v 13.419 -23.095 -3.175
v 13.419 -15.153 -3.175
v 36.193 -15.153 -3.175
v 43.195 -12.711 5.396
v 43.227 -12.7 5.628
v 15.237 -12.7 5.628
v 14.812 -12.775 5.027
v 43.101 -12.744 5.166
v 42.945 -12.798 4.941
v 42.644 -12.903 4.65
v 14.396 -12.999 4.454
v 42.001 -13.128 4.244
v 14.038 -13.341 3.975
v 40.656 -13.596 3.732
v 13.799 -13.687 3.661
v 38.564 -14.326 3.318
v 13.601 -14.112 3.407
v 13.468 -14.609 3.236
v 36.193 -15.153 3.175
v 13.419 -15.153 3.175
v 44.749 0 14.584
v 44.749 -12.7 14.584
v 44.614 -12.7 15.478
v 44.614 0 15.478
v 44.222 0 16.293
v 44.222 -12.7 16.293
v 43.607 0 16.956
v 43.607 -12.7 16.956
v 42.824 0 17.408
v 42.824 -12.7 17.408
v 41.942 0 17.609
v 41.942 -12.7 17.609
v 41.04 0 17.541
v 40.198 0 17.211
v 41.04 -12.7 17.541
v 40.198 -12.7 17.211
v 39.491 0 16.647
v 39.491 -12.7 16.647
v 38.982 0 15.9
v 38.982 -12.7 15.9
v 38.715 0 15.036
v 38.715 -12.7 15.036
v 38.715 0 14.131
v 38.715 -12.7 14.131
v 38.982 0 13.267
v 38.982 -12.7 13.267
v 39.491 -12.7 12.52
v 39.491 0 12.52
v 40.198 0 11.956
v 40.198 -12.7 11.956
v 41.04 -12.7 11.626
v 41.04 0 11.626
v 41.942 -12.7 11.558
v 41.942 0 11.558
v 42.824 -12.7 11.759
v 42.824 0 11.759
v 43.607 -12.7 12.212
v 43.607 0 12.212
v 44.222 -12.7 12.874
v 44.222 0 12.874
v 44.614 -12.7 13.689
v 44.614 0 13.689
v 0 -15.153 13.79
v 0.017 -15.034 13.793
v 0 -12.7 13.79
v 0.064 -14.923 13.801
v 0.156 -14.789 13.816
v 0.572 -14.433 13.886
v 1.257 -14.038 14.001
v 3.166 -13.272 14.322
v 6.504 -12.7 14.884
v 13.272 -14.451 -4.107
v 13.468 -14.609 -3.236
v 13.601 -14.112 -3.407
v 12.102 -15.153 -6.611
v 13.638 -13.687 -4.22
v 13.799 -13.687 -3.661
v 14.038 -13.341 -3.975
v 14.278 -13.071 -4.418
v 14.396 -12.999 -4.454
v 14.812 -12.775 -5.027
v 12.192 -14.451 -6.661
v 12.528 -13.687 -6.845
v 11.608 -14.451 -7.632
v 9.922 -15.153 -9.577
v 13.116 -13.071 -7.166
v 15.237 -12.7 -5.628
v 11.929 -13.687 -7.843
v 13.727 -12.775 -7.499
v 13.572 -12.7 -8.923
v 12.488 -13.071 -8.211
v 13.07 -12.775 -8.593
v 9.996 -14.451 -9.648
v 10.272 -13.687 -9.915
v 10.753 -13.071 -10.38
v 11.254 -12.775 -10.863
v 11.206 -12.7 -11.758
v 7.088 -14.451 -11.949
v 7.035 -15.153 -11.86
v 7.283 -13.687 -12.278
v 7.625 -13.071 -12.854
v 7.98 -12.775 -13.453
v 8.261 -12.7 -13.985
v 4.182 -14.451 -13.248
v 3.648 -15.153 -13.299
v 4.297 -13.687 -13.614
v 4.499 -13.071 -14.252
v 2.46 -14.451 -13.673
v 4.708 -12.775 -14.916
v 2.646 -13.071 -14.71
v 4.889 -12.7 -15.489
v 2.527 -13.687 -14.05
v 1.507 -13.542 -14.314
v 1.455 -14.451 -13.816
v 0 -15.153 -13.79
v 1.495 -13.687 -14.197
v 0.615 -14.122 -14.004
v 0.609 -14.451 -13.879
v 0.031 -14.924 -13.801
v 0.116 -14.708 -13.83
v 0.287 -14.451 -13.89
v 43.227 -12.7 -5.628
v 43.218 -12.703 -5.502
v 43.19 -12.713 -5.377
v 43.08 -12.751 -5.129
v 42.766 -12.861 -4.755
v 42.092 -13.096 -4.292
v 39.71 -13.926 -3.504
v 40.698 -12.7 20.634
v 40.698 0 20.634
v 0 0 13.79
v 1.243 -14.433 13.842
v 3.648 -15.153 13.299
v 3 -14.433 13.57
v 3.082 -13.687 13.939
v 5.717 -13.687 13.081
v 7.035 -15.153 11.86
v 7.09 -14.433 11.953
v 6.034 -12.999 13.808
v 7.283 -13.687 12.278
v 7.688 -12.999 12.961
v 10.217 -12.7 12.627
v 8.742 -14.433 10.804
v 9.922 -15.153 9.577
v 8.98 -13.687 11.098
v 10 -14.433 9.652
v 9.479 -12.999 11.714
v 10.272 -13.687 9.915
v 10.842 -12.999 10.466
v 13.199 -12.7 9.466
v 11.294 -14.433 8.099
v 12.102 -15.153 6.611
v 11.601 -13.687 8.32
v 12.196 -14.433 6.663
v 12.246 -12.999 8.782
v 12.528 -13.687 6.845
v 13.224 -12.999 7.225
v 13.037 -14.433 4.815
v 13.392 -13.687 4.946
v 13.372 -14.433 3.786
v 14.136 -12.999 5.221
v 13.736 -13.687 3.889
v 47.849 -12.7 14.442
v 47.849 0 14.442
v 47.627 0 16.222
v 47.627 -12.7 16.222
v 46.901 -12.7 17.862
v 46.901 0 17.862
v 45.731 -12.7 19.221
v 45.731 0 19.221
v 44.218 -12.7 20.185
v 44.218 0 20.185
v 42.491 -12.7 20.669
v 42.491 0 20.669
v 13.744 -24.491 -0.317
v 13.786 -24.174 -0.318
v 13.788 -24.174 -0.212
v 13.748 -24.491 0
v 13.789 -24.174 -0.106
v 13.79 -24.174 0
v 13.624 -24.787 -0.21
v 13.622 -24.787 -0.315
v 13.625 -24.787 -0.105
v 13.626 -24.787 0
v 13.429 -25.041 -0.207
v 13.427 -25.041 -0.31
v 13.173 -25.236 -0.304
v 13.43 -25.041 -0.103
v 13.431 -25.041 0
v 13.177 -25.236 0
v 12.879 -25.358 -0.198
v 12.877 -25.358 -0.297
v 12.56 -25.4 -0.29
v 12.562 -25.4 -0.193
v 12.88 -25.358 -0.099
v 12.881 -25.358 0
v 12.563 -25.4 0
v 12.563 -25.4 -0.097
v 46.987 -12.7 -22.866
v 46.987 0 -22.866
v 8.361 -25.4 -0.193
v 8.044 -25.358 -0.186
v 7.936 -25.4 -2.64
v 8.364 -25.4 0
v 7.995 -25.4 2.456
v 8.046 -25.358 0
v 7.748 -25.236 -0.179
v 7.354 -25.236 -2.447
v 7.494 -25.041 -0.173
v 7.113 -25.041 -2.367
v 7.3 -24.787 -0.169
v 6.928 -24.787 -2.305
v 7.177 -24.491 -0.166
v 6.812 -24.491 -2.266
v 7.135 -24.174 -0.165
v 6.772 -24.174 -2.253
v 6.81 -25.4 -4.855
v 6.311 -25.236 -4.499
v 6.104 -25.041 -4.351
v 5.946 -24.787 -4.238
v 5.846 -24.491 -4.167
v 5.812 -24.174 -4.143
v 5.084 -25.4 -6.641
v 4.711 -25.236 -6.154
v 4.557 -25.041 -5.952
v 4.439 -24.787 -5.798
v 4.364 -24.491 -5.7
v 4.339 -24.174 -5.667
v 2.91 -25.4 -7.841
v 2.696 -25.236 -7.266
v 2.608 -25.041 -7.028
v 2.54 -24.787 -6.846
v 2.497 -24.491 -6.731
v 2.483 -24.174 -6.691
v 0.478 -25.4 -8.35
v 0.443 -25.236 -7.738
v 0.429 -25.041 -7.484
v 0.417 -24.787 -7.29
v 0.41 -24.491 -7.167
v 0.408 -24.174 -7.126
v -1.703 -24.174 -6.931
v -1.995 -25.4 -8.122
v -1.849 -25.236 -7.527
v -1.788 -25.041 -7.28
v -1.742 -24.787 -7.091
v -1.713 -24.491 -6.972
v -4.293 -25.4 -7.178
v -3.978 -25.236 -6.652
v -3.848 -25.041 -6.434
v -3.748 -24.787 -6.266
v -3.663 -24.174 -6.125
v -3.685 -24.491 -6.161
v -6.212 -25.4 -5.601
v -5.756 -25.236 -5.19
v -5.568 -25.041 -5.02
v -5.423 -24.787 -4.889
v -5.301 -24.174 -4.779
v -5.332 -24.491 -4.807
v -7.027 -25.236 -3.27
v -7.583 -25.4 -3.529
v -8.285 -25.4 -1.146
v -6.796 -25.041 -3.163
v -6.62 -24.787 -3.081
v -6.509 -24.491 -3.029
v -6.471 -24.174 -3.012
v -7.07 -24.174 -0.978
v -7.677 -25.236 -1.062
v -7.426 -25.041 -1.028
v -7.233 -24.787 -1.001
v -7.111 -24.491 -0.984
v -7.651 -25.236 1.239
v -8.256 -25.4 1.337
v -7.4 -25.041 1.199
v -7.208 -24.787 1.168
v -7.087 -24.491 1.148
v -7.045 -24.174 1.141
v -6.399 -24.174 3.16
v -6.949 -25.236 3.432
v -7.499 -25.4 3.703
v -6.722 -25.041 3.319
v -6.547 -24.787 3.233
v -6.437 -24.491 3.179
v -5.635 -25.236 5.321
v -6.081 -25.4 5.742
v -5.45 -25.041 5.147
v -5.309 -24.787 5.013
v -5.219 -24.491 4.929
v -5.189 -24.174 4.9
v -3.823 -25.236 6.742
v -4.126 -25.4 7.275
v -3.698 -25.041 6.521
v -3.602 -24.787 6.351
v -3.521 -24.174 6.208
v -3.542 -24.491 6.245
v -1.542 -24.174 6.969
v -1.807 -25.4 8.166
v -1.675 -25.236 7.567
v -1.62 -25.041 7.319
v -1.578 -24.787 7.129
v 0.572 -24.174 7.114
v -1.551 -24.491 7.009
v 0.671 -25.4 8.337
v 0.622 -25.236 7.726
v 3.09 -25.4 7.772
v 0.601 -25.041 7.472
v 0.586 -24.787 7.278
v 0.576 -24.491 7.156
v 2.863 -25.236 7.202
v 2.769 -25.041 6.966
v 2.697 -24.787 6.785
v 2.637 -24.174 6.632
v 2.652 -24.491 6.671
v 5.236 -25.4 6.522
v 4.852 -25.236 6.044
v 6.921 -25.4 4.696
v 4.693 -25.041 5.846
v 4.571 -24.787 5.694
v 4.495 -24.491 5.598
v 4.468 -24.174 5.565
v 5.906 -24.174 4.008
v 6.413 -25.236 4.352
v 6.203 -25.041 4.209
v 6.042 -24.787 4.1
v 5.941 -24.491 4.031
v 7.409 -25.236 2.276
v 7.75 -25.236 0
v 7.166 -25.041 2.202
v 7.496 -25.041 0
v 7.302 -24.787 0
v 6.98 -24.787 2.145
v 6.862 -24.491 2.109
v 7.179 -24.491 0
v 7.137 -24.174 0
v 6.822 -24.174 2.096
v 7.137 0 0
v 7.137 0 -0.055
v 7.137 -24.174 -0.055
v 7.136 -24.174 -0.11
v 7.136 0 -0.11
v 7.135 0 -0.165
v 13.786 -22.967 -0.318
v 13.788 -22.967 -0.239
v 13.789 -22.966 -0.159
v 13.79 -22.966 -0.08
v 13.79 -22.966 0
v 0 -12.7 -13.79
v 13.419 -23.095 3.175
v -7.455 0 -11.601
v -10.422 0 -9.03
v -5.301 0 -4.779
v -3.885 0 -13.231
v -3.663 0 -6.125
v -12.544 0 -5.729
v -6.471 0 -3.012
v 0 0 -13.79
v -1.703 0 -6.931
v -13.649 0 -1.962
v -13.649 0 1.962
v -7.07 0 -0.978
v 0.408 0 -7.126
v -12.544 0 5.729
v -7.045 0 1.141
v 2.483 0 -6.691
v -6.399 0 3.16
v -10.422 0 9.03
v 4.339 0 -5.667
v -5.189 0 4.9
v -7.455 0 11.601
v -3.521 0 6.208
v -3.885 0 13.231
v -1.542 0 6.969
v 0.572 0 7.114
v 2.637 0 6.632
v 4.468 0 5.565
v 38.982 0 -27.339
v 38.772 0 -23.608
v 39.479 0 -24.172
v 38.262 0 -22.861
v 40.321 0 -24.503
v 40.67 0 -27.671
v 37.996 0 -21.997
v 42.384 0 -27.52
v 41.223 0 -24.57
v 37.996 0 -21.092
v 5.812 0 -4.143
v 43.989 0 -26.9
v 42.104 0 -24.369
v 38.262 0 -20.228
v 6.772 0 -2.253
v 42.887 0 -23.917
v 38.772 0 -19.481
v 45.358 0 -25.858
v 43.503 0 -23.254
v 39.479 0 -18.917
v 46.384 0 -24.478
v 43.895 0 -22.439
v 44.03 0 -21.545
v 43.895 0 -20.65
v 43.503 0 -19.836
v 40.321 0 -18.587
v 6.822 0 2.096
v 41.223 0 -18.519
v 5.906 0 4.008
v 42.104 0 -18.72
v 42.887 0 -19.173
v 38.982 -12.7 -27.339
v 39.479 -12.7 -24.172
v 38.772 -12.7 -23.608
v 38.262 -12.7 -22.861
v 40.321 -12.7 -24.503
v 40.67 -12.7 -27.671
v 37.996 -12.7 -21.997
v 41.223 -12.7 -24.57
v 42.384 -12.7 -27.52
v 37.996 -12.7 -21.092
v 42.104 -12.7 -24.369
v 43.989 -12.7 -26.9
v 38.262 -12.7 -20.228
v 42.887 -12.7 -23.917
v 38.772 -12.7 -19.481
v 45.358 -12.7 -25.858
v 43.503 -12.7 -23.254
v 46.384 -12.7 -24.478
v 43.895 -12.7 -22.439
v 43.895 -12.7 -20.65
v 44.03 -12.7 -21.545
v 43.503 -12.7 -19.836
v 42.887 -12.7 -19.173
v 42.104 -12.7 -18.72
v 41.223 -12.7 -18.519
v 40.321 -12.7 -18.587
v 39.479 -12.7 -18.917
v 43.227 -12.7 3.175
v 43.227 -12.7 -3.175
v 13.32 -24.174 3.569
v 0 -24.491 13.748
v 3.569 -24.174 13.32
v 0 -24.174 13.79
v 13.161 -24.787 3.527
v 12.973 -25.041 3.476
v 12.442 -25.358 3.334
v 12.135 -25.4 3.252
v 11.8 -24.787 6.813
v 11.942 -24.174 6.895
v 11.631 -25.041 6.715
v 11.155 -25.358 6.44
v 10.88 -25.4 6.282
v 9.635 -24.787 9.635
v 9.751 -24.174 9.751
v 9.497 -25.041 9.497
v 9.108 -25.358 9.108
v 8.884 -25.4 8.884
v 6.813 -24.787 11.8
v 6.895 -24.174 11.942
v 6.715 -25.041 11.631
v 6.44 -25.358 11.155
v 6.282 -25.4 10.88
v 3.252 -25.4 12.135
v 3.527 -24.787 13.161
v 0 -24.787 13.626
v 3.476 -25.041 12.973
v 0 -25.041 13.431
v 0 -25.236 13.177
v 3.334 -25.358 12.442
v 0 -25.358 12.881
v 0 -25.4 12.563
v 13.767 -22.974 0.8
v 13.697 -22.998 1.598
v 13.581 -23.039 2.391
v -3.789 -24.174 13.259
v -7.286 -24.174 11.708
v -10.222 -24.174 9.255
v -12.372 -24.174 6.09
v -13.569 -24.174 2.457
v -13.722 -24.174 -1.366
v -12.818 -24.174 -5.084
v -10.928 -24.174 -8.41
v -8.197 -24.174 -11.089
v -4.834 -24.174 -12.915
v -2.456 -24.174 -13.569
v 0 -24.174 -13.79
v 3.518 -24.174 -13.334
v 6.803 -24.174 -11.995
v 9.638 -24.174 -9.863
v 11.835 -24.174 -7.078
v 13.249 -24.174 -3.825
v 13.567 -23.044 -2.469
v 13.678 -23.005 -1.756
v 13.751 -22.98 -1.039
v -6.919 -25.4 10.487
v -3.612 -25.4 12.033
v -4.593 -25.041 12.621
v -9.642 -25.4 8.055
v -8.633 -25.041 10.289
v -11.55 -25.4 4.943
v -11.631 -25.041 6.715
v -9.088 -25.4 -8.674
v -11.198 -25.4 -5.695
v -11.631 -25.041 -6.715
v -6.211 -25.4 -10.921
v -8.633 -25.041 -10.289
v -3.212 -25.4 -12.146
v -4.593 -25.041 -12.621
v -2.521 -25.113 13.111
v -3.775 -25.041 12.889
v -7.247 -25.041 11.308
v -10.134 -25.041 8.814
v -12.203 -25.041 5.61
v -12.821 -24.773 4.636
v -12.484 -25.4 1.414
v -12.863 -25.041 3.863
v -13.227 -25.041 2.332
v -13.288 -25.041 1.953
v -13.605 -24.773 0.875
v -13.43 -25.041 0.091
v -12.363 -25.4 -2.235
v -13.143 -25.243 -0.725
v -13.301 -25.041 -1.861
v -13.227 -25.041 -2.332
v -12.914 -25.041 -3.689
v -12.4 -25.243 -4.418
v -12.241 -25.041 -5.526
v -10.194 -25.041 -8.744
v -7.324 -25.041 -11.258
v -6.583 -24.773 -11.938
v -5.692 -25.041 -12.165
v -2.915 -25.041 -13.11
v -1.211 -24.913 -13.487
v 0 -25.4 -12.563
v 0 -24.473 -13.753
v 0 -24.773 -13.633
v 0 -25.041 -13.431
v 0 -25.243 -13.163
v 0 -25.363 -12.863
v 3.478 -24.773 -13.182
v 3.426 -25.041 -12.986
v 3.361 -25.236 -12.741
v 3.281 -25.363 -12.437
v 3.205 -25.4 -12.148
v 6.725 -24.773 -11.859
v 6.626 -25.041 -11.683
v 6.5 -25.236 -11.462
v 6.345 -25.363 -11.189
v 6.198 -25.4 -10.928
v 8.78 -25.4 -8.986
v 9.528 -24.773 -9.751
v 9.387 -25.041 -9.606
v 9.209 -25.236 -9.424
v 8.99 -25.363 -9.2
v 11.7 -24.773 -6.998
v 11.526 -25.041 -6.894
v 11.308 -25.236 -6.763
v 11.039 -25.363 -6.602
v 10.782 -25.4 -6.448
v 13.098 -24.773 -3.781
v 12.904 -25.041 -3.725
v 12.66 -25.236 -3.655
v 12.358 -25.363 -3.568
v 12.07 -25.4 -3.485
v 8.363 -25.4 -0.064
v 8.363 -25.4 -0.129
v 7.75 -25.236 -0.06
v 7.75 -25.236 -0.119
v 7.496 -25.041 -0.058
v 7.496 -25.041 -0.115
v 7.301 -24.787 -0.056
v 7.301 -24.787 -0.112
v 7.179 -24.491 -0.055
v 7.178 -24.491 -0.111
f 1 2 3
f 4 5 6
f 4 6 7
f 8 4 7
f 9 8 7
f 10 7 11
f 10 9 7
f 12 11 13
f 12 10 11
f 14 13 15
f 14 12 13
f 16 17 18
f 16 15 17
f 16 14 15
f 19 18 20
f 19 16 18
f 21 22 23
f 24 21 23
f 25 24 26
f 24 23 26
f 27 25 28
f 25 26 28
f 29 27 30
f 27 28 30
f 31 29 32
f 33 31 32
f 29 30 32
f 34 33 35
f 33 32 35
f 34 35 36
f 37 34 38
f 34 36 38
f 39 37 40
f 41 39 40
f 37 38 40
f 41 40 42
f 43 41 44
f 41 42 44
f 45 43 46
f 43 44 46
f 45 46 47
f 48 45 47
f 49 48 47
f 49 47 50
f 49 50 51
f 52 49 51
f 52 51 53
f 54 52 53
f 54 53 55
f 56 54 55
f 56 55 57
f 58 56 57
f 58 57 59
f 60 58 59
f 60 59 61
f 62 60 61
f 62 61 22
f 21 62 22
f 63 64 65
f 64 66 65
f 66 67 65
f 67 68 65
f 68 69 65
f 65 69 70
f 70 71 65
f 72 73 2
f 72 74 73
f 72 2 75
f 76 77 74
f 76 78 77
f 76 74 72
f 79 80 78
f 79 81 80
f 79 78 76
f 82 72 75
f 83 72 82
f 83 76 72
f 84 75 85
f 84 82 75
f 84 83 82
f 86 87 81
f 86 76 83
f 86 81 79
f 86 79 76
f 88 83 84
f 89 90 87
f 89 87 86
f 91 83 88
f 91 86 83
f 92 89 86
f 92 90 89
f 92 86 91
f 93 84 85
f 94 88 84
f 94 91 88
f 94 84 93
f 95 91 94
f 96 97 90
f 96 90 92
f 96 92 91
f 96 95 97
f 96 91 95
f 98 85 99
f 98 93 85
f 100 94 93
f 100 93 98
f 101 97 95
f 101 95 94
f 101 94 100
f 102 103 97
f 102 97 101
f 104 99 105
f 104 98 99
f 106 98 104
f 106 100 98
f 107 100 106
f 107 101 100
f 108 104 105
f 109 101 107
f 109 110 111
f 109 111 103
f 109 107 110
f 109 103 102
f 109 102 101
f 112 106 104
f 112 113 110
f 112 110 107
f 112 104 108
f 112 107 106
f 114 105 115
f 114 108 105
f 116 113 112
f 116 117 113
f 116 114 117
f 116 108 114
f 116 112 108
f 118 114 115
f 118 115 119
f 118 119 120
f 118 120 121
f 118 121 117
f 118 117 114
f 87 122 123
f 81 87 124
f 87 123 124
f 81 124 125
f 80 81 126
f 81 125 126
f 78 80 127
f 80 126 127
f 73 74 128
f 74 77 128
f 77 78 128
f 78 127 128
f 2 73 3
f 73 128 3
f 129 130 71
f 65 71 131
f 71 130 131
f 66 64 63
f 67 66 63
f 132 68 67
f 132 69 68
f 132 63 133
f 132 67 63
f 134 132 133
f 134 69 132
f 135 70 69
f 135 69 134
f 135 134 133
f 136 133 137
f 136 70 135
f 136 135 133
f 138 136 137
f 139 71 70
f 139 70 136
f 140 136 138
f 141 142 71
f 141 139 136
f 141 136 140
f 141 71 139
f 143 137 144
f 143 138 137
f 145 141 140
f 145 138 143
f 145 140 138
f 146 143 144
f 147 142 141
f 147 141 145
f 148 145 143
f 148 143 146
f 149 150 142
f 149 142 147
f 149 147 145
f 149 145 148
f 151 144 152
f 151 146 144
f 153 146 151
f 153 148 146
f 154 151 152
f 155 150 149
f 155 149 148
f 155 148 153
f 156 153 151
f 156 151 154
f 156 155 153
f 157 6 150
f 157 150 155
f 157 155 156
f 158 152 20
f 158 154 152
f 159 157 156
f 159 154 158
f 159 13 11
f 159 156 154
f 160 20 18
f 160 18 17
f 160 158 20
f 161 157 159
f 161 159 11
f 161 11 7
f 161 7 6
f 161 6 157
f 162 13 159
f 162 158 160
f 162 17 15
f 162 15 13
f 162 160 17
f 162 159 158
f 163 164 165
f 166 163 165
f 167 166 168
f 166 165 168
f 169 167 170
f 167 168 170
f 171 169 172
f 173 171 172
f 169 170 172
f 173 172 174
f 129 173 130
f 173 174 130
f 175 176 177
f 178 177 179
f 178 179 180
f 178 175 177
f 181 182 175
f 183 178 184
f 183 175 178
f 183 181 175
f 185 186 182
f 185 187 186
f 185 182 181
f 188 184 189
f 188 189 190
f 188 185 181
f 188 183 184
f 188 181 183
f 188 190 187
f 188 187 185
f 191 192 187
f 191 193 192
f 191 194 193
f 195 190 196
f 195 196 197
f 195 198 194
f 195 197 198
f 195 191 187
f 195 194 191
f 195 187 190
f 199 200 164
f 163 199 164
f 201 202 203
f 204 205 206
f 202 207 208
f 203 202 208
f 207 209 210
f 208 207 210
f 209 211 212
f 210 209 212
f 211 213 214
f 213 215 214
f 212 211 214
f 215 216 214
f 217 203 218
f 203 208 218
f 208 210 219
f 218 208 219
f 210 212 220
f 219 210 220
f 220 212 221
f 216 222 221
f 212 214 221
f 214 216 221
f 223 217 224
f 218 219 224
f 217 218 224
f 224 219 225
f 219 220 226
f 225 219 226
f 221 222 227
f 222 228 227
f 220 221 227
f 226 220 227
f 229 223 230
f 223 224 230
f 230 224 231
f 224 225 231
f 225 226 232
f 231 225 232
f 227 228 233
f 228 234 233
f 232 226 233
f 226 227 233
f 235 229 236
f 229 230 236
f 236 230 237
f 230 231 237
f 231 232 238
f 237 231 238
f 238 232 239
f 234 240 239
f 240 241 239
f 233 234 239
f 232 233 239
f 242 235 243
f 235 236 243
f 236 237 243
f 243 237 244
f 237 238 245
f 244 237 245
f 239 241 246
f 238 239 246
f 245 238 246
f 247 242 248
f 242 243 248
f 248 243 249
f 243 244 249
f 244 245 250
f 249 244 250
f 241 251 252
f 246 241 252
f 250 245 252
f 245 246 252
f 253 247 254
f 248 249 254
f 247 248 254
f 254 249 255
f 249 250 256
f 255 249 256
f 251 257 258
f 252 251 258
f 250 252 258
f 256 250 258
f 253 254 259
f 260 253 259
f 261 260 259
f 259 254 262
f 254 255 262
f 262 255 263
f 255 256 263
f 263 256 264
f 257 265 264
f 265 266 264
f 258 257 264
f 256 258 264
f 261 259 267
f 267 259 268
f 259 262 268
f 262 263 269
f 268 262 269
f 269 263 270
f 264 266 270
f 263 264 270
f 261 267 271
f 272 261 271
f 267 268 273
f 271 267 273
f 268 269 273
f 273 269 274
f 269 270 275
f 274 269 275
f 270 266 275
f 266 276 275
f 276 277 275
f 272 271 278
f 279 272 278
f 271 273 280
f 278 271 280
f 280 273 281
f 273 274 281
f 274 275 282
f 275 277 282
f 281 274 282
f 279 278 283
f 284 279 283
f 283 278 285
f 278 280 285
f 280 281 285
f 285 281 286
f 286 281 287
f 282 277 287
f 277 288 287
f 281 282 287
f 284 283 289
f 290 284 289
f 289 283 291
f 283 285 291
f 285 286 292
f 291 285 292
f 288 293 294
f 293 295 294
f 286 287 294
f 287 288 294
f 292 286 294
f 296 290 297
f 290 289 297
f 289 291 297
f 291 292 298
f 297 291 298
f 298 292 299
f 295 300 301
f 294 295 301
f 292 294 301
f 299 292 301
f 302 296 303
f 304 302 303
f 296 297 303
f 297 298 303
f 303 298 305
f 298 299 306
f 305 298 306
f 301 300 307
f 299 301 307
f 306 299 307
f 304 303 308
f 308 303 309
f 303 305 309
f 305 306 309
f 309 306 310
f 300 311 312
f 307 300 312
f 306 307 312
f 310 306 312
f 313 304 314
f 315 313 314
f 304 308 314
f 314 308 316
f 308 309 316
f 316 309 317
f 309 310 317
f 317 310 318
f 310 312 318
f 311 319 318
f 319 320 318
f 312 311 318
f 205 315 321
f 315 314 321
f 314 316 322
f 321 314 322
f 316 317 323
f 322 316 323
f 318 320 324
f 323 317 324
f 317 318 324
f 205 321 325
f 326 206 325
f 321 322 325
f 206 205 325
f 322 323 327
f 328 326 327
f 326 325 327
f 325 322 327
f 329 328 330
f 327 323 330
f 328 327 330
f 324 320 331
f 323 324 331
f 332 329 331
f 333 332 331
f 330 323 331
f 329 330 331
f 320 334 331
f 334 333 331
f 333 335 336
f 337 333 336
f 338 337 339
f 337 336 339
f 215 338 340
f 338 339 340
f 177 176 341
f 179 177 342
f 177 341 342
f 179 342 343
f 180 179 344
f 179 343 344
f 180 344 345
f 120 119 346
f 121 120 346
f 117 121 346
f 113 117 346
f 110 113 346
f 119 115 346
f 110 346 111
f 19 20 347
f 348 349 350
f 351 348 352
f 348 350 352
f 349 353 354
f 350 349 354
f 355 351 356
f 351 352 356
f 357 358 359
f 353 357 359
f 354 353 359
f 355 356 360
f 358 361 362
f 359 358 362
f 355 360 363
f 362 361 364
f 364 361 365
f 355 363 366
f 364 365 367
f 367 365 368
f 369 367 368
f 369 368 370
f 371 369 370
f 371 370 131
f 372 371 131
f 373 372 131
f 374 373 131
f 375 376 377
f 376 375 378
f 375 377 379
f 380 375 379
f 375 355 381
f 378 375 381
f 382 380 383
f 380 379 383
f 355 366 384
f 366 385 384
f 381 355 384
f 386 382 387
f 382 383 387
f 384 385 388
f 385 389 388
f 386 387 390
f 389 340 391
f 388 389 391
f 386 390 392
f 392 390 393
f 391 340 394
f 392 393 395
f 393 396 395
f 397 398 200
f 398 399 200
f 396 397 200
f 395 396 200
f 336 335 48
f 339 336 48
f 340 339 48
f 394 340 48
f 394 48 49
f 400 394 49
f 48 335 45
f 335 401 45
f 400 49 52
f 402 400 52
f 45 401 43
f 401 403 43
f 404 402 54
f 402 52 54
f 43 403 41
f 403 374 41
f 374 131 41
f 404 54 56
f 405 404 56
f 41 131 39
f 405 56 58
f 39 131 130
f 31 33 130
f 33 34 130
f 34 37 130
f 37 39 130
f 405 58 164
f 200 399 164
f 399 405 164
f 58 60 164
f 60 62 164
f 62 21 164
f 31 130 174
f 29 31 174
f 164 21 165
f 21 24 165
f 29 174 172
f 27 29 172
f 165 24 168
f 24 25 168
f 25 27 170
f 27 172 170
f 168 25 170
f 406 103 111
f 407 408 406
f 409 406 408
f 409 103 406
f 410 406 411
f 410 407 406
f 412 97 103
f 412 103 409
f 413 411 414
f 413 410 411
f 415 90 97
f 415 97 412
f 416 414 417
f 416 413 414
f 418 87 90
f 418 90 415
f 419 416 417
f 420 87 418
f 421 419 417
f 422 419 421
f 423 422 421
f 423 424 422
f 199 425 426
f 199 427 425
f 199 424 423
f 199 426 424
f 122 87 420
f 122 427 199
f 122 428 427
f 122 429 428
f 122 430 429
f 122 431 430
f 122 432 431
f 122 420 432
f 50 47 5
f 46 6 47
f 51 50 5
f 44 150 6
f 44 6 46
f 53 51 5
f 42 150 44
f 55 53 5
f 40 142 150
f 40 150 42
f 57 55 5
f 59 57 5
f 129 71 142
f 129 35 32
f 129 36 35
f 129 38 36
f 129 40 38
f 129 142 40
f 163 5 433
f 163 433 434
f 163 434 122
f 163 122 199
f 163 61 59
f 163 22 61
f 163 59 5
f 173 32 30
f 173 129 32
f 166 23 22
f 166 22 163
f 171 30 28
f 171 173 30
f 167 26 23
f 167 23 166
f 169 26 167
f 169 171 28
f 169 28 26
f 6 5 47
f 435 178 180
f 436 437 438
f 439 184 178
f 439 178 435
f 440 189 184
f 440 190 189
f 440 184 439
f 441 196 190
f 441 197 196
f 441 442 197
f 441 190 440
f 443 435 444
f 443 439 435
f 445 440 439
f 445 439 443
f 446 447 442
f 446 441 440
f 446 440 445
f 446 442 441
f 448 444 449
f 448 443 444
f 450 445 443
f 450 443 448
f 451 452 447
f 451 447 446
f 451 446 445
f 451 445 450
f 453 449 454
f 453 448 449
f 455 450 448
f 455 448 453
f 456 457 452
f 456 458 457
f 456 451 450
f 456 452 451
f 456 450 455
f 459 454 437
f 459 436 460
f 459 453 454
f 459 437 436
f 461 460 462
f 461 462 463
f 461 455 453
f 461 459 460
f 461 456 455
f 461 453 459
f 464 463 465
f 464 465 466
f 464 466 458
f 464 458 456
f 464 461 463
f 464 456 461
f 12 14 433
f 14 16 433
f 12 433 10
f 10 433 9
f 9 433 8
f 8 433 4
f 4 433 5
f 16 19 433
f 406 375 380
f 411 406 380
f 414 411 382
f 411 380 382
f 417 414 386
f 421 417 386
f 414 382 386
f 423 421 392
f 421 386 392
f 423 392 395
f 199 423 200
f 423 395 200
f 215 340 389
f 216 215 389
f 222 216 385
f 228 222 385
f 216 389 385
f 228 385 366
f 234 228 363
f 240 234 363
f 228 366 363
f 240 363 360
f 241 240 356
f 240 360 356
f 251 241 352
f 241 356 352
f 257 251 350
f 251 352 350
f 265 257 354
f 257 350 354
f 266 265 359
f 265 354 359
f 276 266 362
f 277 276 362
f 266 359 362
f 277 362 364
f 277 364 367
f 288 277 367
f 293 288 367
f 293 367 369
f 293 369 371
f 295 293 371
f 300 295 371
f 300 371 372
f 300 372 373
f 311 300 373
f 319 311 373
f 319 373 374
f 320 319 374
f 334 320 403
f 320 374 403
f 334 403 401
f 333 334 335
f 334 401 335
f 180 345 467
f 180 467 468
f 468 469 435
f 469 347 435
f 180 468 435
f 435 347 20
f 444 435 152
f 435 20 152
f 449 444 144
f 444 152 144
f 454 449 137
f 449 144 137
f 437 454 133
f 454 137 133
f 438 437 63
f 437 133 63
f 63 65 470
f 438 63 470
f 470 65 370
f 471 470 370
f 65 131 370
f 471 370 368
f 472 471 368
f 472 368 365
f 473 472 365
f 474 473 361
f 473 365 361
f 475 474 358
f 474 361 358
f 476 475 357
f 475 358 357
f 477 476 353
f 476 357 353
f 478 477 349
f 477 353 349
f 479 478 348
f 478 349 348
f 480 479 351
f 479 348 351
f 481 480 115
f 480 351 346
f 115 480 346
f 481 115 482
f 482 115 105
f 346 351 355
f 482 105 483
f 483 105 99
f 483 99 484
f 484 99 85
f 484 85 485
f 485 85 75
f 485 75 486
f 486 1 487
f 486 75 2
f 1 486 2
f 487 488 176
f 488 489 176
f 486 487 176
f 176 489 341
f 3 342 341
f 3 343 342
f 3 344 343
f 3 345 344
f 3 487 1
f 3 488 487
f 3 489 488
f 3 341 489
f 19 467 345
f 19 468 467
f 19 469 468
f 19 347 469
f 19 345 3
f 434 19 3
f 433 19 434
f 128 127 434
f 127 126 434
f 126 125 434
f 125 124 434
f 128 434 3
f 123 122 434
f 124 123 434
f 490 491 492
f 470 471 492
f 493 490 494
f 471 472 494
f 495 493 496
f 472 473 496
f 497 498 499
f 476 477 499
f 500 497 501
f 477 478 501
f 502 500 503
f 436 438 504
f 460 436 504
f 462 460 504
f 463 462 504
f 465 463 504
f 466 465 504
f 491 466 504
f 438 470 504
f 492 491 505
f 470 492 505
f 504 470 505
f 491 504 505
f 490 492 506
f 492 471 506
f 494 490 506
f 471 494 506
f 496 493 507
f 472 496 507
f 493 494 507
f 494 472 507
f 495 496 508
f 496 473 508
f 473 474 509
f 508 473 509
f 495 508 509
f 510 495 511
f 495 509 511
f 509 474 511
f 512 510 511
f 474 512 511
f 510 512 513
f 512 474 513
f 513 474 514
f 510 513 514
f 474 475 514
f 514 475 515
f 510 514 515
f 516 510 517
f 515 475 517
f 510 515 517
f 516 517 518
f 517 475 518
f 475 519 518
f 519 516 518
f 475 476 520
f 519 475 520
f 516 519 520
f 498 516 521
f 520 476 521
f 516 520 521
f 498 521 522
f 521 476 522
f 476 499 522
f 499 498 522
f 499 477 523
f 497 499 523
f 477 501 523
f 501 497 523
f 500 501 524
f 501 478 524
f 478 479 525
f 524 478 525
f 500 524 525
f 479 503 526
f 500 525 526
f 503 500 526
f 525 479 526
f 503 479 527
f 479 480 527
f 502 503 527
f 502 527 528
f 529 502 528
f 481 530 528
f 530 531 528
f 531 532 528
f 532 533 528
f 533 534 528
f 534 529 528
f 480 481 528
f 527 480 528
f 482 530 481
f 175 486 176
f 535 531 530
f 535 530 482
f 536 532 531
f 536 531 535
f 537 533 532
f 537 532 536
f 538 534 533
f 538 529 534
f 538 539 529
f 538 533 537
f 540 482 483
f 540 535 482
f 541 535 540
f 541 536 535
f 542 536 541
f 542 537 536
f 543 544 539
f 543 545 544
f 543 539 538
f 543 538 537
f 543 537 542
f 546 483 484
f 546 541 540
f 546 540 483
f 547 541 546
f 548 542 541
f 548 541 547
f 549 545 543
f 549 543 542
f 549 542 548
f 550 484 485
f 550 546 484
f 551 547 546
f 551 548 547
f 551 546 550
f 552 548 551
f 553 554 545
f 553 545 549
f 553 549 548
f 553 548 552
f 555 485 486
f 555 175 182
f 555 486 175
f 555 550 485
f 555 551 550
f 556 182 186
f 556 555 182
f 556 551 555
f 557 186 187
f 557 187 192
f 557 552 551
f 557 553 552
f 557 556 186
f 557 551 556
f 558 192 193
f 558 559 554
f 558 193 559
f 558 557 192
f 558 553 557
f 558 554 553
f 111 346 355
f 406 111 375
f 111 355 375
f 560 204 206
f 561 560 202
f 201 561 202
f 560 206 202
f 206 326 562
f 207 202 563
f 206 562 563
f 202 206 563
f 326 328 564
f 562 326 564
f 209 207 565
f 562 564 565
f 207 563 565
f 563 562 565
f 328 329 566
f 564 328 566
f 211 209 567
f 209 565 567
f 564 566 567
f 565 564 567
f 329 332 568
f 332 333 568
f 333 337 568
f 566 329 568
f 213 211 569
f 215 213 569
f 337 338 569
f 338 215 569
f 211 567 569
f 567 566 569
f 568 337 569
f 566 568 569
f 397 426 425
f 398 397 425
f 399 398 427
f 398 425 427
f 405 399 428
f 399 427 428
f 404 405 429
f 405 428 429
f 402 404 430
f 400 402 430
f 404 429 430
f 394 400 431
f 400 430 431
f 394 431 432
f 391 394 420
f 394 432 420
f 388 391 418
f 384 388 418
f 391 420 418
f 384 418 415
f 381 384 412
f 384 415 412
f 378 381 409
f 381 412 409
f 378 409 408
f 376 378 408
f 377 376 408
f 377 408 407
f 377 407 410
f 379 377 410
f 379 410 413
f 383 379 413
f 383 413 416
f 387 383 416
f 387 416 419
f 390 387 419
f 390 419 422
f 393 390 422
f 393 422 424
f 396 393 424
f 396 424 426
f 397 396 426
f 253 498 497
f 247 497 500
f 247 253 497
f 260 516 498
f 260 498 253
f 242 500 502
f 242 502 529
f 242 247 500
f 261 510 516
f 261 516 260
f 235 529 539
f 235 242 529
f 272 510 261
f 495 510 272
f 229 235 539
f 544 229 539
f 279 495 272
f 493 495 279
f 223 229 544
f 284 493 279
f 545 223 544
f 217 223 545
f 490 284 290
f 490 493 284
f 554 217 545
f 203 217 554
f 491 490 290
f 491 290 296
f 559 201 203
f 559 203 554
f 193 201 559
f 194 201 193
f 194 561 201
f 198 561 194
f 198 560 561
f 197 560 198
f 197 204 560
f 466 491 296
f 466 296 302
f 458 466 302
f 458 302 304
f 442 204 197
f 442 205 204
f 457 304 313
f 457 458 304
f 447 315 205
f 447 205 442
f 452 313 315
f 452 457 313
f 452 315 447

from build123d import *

# Parameters (mm, degrees)
F1_DEPTH     = 12.7
F2_DEPTH     = 25.4
F3_R         = 3.0339595682
F4_DEPTH     = 25.4
F5_R         = 1.2264204897
F7_DEPTH     = 3.175
F8_T4_ANGLE  = 97.0773840638
F8_T9_DEPTH  = 34.7132171162
F8_T14_ANGLE = 97.0773840638
F8_T19_DEPTH = 34.7132171162


# Not quite as in the source:
# - a fillet or chamfer that OpenCascade refuses, or shapes differently, is made with other operations: its cross-section is extruded or revolved along the edge and cut away or added


with BuildPart() as f1:
    # F0 (on Front) → F1 (new body)
    with BuildSketch(Plane.XZ):
        with BuildLine():
            ThreePointArc((0, -13.789825828), (9.6376295499, -9.8628288552), (13.7861481364, -0.3184586768))
            ThreePointArc((13.7861481364, -0.3184586768), (13.7889063745, -0.1592399559), (13.789825828, 0))
            ThreePointArc((13.789825828, 0), (9.7508793544, 9.7508793544), (0, 13.789825828))
            ThreePointArc((0, 13.789825828), (-13.789825828, 0), (0, -13.789825828))
        make_face()
        with BuildLine():
            ThreePointArc((7.1353728529, -0.1648264167), (-7.1368004494, 0.0824187037), (7.137276336, 0))
            ThreePointArc((7.137276336, 0), (7.1368004494, -0.0824187037), (7.1353728529, -0.1648264167))
        make_face(mode=Mode.SUBTRACT)
        with BuildLine():
            ThreePointArc((13.789825828, 0), (13.7889063745, -0.1592399559), (13.7861481364, -0.3184586768))
            ThreePointArc((13.7861481364, -0.3184586768), (9.6376295499, -9.8628288552), (0, -13.789825828))
            Line((0, -13.789825828), (38.9815755188, -27.3394305259))
            ThreePointArc((38.9815755188, -27.3394305259), (43.9885292005, -26.9000346666), (46.9867042389, -22.8659795937))
            Line((46.9867042389, -22.8659795937), (47.8485122544, 14.4418842975))
            ThreePointArc((47.8485122544, 14.4418842975), (45.7311207367, 19.22142423), (40.6978976177, 20.6335197794))
            Line((40.6978976177, 20.6335197794), (0, 13.789825828))
            ThreePointArc((0, 13.789825828), (9.7508793544, 9.7508793544), (13.789825828, 0))
        make_face()
    extrude(amount=F1_DEPTH)

    # F0 (on Front) → F2 (join)
    with BuildSketch(Plane.XZ):
        with BuildLine():
            ThreePointArc((0, -13.789825828), (9.6376295499, -9.8628288552), (13.7861481364, -0.3184586768))
            ThreePointArc((13.7861481364, -0.3184586768), (13.7889063745, -0.1592399559), (13.789825828, 0))
            ThreePointArc((13.789825828, 0), (9.7508793544, 9.7508793544), (0, 13.789825828))
            ThreePointArc((0, 13.789825828), (-13.789825828, 0), (0, -13.789825828))
        make_face()
        with BuildLine():
            ThreePointArc((7.1353728529, -0.1648264167), (-7.1368004494, 0.0824187037), (7.137276336, 0))
            ThreePointArc((7.137276336, 0), (7.1368004494, -0.0824187037), (7.1353728529, -0.1648264167))
        make_face(mode=Mode.SUBTRACT)
    extrude(amount=F2_DEPTH)

    # F3 (on face) → F4 (cut)
    with BuildSketch(Plane.XZ.offset(12.7)):
        with Locations((40.9957959094, -21.5446131849)):
            Circle(F3_R)
        with Locations((41.715248914, 14.5835620822)):
            Circle(F3_R)
    extrude(amount=-F4_DEPTH, mode=Mode.SUBTRACT)

    # F5
    f5_edges = [f1.edges().sort_by_distance(p)[0] for p in [
        (0, -25.4, 13.789826),
        (-7.137276, -25.4, 0),
    ]]
    fillet(f5_edges, radius=F5_R)

    # F6 (on Top) → F7 (join, symmetric)
    with BuildSketch(Plane.XY):
        Polygon((13.3344670758, -12.2673781589), (13.3344670758, -23.1246650219), (44.4674044847, -12.2673781589), align=None)
    extrude(amount=F7_DEPTH, both=True)

    # F8: fillet of radius 2.4528409794 on 4 edges, made by hand


with BuildPart() as f8_tool2:
    # F8_s3 → F8_t4 (revolve)
    with BuildSketch(Plane(origin=(0, 0, 0), x_dir=(0, 1, 0), z_dir=(0.0543746304, 0, 0.9985206055))):
        with BuildLine():
            ThreePointArc((-15.1528409794, -13.789825828), (-13.4184204897, -14.5082463177), (-12.7, -16.2426668074))
            Line((-12.7, -16.2426668074), (-12.6509431804, -16.2426668074))
            Line((-12.6509431804, -16.2426668074), (-12.6509431804, -13.7407690084))
            Line((-12.6509431804, -13.7407690084), (-15.1528409794, -13.7407690084))
            Line((-15.1528409794, -13.7407690084), (-15.1528409794, -13.789825828))
        make_face()
    revolve(axis=Axis((0, -12.7, 0), (0, 1, 0)), revolution_arc=F8_T4_ANGLE)

    split(bisect_by=Plane(origin=(-4.2765210661, 0, -12.3033499954), x_dir=(0, 1, 0), z_dir=(0.3283216608, 0, 0.9445659781)), keep=Keep.TOP)


with BuildPart() as f1_1:
    add(f1.part)

    # F8_t1: union F8_tool2
    add(f8_tool2.part)


with BuildPart() as f8_tool7:
    # F8_s8 → F8_t9 (new body)
    with BuildSketch(Plane.YZ.offset(45.6797155903)):
        with BuildLine():
            ThreePointArc((-12.7, -5.6278409794), (-13.4184204897, -3.8934204897), (-15.1528409794, -3.175))
            Line((-15.1528409794, -3.175), (-15.1528409794, -3.1259431804))
            Line((-15.1528409794, -3.1259431804), (-12.6509431804, -3.1259431804))
            Line((-12.6509431804, -3.1259431804), (-12.6509431804, -5.6278409794))
            Line((-12.6509431804, -5.6278409794), (-12.7, -5.6278409794))
        make_face()
    extrude(amount=-F8_T9_DEPTH)

    split(bisect_by=Plane(origin=(8.6359194604, -24.7632344453, 0), x_dir=(0, 0, 1), z_dir=(-0.3292899537, 0.9442288528, 0)), keep=Keep.TOP)


with BuildPart() as f1_2:
    add(f1_1.part)

    # F8_t6: union F8_tool7
    add(f8_tool7.part)


with BuildPart() as f8_tool12:
    # F8_s13 → F8_t14 (revolve)
    with BuildSketch(Plane(origin=(0, 0, 0), x_dir=(0, 1, 0), z_dir=(-0.9842130406, 0, -0.1769878264))):
        with BuildLine():
            ThreePointArc((-15.1528409794, -13.789825828), (-13.4184204897, -14.5082463177), (-12.7, -16.2426668074))
            Line((-12.7, -16.2426668074), (-12.6509431804, -16.2426668074))
            Line((-12.6509431804, -16.2426668074), (-12.6509431804, -13.7407690084))
            Line((-12.6509431804, -13.7407690084), (-15.1528409794, -13.7407690084))
            Line((-15.1528409794, -13.7407690084), (-15.1528409794, -13.789825828))
        make_face()
    revolve(axis=Axis((0, -12.7, 0), (0, 1, 0)), revolution_arc=F8_T14_ANGLE)

    split(bisect_by=Plane(origin=(-2.2551070217, 0, 13.4106106059), x_dir=(0, 1, 0), z_dir=(0.1658301489, 0, -0.9861543296)), keep=Keep.TOP)


with BuildPart() as f1_3:
    add(f1_2.part)

    # F8_t11: union F8_tool12
    add(f8_tool12.part)


with BuildPart() as f8_tool17:
    # F8_s18 → F8_t19 (new body)
    with BuildSketch(Plane.YZ.offset(45.6797155903)):
        with BuildLine():
            ThreePointArc((-12.7, 5.6278409794), (-13.4184204897, 3.8934204897), (-15.1528409794, 3.175))
            Line((-15.1528409794, 3.175), (-15.1528409794, 3.1259431804))
            Line((-15.1528409794, 3.1259431804), (-12.6509431804, 3.1259431804))
            Line((-12.6509431804, 3.1259431804), (-12.6509431804, 5.6278409794))
            Line((-12.6509431804, 5.6278409794), (-12.7, 5.6278409794))
        make_face()
    extrude(amount=-F8_T19_DEPTH)

    split(bisect_by=Plane(origin=(8.6359194604, -24.7632344453, 0), x_dir=(0, 0, 1), z_dir=(-0.3292899537, 0.9442288528, 0)), keep=Keep.TOP)


with BuildPart() as f1_4:
    add(f1_3.part)

    # F8_t16: union F8_tool17
    add(f8_tool17.part)


solid = f1_4.part
